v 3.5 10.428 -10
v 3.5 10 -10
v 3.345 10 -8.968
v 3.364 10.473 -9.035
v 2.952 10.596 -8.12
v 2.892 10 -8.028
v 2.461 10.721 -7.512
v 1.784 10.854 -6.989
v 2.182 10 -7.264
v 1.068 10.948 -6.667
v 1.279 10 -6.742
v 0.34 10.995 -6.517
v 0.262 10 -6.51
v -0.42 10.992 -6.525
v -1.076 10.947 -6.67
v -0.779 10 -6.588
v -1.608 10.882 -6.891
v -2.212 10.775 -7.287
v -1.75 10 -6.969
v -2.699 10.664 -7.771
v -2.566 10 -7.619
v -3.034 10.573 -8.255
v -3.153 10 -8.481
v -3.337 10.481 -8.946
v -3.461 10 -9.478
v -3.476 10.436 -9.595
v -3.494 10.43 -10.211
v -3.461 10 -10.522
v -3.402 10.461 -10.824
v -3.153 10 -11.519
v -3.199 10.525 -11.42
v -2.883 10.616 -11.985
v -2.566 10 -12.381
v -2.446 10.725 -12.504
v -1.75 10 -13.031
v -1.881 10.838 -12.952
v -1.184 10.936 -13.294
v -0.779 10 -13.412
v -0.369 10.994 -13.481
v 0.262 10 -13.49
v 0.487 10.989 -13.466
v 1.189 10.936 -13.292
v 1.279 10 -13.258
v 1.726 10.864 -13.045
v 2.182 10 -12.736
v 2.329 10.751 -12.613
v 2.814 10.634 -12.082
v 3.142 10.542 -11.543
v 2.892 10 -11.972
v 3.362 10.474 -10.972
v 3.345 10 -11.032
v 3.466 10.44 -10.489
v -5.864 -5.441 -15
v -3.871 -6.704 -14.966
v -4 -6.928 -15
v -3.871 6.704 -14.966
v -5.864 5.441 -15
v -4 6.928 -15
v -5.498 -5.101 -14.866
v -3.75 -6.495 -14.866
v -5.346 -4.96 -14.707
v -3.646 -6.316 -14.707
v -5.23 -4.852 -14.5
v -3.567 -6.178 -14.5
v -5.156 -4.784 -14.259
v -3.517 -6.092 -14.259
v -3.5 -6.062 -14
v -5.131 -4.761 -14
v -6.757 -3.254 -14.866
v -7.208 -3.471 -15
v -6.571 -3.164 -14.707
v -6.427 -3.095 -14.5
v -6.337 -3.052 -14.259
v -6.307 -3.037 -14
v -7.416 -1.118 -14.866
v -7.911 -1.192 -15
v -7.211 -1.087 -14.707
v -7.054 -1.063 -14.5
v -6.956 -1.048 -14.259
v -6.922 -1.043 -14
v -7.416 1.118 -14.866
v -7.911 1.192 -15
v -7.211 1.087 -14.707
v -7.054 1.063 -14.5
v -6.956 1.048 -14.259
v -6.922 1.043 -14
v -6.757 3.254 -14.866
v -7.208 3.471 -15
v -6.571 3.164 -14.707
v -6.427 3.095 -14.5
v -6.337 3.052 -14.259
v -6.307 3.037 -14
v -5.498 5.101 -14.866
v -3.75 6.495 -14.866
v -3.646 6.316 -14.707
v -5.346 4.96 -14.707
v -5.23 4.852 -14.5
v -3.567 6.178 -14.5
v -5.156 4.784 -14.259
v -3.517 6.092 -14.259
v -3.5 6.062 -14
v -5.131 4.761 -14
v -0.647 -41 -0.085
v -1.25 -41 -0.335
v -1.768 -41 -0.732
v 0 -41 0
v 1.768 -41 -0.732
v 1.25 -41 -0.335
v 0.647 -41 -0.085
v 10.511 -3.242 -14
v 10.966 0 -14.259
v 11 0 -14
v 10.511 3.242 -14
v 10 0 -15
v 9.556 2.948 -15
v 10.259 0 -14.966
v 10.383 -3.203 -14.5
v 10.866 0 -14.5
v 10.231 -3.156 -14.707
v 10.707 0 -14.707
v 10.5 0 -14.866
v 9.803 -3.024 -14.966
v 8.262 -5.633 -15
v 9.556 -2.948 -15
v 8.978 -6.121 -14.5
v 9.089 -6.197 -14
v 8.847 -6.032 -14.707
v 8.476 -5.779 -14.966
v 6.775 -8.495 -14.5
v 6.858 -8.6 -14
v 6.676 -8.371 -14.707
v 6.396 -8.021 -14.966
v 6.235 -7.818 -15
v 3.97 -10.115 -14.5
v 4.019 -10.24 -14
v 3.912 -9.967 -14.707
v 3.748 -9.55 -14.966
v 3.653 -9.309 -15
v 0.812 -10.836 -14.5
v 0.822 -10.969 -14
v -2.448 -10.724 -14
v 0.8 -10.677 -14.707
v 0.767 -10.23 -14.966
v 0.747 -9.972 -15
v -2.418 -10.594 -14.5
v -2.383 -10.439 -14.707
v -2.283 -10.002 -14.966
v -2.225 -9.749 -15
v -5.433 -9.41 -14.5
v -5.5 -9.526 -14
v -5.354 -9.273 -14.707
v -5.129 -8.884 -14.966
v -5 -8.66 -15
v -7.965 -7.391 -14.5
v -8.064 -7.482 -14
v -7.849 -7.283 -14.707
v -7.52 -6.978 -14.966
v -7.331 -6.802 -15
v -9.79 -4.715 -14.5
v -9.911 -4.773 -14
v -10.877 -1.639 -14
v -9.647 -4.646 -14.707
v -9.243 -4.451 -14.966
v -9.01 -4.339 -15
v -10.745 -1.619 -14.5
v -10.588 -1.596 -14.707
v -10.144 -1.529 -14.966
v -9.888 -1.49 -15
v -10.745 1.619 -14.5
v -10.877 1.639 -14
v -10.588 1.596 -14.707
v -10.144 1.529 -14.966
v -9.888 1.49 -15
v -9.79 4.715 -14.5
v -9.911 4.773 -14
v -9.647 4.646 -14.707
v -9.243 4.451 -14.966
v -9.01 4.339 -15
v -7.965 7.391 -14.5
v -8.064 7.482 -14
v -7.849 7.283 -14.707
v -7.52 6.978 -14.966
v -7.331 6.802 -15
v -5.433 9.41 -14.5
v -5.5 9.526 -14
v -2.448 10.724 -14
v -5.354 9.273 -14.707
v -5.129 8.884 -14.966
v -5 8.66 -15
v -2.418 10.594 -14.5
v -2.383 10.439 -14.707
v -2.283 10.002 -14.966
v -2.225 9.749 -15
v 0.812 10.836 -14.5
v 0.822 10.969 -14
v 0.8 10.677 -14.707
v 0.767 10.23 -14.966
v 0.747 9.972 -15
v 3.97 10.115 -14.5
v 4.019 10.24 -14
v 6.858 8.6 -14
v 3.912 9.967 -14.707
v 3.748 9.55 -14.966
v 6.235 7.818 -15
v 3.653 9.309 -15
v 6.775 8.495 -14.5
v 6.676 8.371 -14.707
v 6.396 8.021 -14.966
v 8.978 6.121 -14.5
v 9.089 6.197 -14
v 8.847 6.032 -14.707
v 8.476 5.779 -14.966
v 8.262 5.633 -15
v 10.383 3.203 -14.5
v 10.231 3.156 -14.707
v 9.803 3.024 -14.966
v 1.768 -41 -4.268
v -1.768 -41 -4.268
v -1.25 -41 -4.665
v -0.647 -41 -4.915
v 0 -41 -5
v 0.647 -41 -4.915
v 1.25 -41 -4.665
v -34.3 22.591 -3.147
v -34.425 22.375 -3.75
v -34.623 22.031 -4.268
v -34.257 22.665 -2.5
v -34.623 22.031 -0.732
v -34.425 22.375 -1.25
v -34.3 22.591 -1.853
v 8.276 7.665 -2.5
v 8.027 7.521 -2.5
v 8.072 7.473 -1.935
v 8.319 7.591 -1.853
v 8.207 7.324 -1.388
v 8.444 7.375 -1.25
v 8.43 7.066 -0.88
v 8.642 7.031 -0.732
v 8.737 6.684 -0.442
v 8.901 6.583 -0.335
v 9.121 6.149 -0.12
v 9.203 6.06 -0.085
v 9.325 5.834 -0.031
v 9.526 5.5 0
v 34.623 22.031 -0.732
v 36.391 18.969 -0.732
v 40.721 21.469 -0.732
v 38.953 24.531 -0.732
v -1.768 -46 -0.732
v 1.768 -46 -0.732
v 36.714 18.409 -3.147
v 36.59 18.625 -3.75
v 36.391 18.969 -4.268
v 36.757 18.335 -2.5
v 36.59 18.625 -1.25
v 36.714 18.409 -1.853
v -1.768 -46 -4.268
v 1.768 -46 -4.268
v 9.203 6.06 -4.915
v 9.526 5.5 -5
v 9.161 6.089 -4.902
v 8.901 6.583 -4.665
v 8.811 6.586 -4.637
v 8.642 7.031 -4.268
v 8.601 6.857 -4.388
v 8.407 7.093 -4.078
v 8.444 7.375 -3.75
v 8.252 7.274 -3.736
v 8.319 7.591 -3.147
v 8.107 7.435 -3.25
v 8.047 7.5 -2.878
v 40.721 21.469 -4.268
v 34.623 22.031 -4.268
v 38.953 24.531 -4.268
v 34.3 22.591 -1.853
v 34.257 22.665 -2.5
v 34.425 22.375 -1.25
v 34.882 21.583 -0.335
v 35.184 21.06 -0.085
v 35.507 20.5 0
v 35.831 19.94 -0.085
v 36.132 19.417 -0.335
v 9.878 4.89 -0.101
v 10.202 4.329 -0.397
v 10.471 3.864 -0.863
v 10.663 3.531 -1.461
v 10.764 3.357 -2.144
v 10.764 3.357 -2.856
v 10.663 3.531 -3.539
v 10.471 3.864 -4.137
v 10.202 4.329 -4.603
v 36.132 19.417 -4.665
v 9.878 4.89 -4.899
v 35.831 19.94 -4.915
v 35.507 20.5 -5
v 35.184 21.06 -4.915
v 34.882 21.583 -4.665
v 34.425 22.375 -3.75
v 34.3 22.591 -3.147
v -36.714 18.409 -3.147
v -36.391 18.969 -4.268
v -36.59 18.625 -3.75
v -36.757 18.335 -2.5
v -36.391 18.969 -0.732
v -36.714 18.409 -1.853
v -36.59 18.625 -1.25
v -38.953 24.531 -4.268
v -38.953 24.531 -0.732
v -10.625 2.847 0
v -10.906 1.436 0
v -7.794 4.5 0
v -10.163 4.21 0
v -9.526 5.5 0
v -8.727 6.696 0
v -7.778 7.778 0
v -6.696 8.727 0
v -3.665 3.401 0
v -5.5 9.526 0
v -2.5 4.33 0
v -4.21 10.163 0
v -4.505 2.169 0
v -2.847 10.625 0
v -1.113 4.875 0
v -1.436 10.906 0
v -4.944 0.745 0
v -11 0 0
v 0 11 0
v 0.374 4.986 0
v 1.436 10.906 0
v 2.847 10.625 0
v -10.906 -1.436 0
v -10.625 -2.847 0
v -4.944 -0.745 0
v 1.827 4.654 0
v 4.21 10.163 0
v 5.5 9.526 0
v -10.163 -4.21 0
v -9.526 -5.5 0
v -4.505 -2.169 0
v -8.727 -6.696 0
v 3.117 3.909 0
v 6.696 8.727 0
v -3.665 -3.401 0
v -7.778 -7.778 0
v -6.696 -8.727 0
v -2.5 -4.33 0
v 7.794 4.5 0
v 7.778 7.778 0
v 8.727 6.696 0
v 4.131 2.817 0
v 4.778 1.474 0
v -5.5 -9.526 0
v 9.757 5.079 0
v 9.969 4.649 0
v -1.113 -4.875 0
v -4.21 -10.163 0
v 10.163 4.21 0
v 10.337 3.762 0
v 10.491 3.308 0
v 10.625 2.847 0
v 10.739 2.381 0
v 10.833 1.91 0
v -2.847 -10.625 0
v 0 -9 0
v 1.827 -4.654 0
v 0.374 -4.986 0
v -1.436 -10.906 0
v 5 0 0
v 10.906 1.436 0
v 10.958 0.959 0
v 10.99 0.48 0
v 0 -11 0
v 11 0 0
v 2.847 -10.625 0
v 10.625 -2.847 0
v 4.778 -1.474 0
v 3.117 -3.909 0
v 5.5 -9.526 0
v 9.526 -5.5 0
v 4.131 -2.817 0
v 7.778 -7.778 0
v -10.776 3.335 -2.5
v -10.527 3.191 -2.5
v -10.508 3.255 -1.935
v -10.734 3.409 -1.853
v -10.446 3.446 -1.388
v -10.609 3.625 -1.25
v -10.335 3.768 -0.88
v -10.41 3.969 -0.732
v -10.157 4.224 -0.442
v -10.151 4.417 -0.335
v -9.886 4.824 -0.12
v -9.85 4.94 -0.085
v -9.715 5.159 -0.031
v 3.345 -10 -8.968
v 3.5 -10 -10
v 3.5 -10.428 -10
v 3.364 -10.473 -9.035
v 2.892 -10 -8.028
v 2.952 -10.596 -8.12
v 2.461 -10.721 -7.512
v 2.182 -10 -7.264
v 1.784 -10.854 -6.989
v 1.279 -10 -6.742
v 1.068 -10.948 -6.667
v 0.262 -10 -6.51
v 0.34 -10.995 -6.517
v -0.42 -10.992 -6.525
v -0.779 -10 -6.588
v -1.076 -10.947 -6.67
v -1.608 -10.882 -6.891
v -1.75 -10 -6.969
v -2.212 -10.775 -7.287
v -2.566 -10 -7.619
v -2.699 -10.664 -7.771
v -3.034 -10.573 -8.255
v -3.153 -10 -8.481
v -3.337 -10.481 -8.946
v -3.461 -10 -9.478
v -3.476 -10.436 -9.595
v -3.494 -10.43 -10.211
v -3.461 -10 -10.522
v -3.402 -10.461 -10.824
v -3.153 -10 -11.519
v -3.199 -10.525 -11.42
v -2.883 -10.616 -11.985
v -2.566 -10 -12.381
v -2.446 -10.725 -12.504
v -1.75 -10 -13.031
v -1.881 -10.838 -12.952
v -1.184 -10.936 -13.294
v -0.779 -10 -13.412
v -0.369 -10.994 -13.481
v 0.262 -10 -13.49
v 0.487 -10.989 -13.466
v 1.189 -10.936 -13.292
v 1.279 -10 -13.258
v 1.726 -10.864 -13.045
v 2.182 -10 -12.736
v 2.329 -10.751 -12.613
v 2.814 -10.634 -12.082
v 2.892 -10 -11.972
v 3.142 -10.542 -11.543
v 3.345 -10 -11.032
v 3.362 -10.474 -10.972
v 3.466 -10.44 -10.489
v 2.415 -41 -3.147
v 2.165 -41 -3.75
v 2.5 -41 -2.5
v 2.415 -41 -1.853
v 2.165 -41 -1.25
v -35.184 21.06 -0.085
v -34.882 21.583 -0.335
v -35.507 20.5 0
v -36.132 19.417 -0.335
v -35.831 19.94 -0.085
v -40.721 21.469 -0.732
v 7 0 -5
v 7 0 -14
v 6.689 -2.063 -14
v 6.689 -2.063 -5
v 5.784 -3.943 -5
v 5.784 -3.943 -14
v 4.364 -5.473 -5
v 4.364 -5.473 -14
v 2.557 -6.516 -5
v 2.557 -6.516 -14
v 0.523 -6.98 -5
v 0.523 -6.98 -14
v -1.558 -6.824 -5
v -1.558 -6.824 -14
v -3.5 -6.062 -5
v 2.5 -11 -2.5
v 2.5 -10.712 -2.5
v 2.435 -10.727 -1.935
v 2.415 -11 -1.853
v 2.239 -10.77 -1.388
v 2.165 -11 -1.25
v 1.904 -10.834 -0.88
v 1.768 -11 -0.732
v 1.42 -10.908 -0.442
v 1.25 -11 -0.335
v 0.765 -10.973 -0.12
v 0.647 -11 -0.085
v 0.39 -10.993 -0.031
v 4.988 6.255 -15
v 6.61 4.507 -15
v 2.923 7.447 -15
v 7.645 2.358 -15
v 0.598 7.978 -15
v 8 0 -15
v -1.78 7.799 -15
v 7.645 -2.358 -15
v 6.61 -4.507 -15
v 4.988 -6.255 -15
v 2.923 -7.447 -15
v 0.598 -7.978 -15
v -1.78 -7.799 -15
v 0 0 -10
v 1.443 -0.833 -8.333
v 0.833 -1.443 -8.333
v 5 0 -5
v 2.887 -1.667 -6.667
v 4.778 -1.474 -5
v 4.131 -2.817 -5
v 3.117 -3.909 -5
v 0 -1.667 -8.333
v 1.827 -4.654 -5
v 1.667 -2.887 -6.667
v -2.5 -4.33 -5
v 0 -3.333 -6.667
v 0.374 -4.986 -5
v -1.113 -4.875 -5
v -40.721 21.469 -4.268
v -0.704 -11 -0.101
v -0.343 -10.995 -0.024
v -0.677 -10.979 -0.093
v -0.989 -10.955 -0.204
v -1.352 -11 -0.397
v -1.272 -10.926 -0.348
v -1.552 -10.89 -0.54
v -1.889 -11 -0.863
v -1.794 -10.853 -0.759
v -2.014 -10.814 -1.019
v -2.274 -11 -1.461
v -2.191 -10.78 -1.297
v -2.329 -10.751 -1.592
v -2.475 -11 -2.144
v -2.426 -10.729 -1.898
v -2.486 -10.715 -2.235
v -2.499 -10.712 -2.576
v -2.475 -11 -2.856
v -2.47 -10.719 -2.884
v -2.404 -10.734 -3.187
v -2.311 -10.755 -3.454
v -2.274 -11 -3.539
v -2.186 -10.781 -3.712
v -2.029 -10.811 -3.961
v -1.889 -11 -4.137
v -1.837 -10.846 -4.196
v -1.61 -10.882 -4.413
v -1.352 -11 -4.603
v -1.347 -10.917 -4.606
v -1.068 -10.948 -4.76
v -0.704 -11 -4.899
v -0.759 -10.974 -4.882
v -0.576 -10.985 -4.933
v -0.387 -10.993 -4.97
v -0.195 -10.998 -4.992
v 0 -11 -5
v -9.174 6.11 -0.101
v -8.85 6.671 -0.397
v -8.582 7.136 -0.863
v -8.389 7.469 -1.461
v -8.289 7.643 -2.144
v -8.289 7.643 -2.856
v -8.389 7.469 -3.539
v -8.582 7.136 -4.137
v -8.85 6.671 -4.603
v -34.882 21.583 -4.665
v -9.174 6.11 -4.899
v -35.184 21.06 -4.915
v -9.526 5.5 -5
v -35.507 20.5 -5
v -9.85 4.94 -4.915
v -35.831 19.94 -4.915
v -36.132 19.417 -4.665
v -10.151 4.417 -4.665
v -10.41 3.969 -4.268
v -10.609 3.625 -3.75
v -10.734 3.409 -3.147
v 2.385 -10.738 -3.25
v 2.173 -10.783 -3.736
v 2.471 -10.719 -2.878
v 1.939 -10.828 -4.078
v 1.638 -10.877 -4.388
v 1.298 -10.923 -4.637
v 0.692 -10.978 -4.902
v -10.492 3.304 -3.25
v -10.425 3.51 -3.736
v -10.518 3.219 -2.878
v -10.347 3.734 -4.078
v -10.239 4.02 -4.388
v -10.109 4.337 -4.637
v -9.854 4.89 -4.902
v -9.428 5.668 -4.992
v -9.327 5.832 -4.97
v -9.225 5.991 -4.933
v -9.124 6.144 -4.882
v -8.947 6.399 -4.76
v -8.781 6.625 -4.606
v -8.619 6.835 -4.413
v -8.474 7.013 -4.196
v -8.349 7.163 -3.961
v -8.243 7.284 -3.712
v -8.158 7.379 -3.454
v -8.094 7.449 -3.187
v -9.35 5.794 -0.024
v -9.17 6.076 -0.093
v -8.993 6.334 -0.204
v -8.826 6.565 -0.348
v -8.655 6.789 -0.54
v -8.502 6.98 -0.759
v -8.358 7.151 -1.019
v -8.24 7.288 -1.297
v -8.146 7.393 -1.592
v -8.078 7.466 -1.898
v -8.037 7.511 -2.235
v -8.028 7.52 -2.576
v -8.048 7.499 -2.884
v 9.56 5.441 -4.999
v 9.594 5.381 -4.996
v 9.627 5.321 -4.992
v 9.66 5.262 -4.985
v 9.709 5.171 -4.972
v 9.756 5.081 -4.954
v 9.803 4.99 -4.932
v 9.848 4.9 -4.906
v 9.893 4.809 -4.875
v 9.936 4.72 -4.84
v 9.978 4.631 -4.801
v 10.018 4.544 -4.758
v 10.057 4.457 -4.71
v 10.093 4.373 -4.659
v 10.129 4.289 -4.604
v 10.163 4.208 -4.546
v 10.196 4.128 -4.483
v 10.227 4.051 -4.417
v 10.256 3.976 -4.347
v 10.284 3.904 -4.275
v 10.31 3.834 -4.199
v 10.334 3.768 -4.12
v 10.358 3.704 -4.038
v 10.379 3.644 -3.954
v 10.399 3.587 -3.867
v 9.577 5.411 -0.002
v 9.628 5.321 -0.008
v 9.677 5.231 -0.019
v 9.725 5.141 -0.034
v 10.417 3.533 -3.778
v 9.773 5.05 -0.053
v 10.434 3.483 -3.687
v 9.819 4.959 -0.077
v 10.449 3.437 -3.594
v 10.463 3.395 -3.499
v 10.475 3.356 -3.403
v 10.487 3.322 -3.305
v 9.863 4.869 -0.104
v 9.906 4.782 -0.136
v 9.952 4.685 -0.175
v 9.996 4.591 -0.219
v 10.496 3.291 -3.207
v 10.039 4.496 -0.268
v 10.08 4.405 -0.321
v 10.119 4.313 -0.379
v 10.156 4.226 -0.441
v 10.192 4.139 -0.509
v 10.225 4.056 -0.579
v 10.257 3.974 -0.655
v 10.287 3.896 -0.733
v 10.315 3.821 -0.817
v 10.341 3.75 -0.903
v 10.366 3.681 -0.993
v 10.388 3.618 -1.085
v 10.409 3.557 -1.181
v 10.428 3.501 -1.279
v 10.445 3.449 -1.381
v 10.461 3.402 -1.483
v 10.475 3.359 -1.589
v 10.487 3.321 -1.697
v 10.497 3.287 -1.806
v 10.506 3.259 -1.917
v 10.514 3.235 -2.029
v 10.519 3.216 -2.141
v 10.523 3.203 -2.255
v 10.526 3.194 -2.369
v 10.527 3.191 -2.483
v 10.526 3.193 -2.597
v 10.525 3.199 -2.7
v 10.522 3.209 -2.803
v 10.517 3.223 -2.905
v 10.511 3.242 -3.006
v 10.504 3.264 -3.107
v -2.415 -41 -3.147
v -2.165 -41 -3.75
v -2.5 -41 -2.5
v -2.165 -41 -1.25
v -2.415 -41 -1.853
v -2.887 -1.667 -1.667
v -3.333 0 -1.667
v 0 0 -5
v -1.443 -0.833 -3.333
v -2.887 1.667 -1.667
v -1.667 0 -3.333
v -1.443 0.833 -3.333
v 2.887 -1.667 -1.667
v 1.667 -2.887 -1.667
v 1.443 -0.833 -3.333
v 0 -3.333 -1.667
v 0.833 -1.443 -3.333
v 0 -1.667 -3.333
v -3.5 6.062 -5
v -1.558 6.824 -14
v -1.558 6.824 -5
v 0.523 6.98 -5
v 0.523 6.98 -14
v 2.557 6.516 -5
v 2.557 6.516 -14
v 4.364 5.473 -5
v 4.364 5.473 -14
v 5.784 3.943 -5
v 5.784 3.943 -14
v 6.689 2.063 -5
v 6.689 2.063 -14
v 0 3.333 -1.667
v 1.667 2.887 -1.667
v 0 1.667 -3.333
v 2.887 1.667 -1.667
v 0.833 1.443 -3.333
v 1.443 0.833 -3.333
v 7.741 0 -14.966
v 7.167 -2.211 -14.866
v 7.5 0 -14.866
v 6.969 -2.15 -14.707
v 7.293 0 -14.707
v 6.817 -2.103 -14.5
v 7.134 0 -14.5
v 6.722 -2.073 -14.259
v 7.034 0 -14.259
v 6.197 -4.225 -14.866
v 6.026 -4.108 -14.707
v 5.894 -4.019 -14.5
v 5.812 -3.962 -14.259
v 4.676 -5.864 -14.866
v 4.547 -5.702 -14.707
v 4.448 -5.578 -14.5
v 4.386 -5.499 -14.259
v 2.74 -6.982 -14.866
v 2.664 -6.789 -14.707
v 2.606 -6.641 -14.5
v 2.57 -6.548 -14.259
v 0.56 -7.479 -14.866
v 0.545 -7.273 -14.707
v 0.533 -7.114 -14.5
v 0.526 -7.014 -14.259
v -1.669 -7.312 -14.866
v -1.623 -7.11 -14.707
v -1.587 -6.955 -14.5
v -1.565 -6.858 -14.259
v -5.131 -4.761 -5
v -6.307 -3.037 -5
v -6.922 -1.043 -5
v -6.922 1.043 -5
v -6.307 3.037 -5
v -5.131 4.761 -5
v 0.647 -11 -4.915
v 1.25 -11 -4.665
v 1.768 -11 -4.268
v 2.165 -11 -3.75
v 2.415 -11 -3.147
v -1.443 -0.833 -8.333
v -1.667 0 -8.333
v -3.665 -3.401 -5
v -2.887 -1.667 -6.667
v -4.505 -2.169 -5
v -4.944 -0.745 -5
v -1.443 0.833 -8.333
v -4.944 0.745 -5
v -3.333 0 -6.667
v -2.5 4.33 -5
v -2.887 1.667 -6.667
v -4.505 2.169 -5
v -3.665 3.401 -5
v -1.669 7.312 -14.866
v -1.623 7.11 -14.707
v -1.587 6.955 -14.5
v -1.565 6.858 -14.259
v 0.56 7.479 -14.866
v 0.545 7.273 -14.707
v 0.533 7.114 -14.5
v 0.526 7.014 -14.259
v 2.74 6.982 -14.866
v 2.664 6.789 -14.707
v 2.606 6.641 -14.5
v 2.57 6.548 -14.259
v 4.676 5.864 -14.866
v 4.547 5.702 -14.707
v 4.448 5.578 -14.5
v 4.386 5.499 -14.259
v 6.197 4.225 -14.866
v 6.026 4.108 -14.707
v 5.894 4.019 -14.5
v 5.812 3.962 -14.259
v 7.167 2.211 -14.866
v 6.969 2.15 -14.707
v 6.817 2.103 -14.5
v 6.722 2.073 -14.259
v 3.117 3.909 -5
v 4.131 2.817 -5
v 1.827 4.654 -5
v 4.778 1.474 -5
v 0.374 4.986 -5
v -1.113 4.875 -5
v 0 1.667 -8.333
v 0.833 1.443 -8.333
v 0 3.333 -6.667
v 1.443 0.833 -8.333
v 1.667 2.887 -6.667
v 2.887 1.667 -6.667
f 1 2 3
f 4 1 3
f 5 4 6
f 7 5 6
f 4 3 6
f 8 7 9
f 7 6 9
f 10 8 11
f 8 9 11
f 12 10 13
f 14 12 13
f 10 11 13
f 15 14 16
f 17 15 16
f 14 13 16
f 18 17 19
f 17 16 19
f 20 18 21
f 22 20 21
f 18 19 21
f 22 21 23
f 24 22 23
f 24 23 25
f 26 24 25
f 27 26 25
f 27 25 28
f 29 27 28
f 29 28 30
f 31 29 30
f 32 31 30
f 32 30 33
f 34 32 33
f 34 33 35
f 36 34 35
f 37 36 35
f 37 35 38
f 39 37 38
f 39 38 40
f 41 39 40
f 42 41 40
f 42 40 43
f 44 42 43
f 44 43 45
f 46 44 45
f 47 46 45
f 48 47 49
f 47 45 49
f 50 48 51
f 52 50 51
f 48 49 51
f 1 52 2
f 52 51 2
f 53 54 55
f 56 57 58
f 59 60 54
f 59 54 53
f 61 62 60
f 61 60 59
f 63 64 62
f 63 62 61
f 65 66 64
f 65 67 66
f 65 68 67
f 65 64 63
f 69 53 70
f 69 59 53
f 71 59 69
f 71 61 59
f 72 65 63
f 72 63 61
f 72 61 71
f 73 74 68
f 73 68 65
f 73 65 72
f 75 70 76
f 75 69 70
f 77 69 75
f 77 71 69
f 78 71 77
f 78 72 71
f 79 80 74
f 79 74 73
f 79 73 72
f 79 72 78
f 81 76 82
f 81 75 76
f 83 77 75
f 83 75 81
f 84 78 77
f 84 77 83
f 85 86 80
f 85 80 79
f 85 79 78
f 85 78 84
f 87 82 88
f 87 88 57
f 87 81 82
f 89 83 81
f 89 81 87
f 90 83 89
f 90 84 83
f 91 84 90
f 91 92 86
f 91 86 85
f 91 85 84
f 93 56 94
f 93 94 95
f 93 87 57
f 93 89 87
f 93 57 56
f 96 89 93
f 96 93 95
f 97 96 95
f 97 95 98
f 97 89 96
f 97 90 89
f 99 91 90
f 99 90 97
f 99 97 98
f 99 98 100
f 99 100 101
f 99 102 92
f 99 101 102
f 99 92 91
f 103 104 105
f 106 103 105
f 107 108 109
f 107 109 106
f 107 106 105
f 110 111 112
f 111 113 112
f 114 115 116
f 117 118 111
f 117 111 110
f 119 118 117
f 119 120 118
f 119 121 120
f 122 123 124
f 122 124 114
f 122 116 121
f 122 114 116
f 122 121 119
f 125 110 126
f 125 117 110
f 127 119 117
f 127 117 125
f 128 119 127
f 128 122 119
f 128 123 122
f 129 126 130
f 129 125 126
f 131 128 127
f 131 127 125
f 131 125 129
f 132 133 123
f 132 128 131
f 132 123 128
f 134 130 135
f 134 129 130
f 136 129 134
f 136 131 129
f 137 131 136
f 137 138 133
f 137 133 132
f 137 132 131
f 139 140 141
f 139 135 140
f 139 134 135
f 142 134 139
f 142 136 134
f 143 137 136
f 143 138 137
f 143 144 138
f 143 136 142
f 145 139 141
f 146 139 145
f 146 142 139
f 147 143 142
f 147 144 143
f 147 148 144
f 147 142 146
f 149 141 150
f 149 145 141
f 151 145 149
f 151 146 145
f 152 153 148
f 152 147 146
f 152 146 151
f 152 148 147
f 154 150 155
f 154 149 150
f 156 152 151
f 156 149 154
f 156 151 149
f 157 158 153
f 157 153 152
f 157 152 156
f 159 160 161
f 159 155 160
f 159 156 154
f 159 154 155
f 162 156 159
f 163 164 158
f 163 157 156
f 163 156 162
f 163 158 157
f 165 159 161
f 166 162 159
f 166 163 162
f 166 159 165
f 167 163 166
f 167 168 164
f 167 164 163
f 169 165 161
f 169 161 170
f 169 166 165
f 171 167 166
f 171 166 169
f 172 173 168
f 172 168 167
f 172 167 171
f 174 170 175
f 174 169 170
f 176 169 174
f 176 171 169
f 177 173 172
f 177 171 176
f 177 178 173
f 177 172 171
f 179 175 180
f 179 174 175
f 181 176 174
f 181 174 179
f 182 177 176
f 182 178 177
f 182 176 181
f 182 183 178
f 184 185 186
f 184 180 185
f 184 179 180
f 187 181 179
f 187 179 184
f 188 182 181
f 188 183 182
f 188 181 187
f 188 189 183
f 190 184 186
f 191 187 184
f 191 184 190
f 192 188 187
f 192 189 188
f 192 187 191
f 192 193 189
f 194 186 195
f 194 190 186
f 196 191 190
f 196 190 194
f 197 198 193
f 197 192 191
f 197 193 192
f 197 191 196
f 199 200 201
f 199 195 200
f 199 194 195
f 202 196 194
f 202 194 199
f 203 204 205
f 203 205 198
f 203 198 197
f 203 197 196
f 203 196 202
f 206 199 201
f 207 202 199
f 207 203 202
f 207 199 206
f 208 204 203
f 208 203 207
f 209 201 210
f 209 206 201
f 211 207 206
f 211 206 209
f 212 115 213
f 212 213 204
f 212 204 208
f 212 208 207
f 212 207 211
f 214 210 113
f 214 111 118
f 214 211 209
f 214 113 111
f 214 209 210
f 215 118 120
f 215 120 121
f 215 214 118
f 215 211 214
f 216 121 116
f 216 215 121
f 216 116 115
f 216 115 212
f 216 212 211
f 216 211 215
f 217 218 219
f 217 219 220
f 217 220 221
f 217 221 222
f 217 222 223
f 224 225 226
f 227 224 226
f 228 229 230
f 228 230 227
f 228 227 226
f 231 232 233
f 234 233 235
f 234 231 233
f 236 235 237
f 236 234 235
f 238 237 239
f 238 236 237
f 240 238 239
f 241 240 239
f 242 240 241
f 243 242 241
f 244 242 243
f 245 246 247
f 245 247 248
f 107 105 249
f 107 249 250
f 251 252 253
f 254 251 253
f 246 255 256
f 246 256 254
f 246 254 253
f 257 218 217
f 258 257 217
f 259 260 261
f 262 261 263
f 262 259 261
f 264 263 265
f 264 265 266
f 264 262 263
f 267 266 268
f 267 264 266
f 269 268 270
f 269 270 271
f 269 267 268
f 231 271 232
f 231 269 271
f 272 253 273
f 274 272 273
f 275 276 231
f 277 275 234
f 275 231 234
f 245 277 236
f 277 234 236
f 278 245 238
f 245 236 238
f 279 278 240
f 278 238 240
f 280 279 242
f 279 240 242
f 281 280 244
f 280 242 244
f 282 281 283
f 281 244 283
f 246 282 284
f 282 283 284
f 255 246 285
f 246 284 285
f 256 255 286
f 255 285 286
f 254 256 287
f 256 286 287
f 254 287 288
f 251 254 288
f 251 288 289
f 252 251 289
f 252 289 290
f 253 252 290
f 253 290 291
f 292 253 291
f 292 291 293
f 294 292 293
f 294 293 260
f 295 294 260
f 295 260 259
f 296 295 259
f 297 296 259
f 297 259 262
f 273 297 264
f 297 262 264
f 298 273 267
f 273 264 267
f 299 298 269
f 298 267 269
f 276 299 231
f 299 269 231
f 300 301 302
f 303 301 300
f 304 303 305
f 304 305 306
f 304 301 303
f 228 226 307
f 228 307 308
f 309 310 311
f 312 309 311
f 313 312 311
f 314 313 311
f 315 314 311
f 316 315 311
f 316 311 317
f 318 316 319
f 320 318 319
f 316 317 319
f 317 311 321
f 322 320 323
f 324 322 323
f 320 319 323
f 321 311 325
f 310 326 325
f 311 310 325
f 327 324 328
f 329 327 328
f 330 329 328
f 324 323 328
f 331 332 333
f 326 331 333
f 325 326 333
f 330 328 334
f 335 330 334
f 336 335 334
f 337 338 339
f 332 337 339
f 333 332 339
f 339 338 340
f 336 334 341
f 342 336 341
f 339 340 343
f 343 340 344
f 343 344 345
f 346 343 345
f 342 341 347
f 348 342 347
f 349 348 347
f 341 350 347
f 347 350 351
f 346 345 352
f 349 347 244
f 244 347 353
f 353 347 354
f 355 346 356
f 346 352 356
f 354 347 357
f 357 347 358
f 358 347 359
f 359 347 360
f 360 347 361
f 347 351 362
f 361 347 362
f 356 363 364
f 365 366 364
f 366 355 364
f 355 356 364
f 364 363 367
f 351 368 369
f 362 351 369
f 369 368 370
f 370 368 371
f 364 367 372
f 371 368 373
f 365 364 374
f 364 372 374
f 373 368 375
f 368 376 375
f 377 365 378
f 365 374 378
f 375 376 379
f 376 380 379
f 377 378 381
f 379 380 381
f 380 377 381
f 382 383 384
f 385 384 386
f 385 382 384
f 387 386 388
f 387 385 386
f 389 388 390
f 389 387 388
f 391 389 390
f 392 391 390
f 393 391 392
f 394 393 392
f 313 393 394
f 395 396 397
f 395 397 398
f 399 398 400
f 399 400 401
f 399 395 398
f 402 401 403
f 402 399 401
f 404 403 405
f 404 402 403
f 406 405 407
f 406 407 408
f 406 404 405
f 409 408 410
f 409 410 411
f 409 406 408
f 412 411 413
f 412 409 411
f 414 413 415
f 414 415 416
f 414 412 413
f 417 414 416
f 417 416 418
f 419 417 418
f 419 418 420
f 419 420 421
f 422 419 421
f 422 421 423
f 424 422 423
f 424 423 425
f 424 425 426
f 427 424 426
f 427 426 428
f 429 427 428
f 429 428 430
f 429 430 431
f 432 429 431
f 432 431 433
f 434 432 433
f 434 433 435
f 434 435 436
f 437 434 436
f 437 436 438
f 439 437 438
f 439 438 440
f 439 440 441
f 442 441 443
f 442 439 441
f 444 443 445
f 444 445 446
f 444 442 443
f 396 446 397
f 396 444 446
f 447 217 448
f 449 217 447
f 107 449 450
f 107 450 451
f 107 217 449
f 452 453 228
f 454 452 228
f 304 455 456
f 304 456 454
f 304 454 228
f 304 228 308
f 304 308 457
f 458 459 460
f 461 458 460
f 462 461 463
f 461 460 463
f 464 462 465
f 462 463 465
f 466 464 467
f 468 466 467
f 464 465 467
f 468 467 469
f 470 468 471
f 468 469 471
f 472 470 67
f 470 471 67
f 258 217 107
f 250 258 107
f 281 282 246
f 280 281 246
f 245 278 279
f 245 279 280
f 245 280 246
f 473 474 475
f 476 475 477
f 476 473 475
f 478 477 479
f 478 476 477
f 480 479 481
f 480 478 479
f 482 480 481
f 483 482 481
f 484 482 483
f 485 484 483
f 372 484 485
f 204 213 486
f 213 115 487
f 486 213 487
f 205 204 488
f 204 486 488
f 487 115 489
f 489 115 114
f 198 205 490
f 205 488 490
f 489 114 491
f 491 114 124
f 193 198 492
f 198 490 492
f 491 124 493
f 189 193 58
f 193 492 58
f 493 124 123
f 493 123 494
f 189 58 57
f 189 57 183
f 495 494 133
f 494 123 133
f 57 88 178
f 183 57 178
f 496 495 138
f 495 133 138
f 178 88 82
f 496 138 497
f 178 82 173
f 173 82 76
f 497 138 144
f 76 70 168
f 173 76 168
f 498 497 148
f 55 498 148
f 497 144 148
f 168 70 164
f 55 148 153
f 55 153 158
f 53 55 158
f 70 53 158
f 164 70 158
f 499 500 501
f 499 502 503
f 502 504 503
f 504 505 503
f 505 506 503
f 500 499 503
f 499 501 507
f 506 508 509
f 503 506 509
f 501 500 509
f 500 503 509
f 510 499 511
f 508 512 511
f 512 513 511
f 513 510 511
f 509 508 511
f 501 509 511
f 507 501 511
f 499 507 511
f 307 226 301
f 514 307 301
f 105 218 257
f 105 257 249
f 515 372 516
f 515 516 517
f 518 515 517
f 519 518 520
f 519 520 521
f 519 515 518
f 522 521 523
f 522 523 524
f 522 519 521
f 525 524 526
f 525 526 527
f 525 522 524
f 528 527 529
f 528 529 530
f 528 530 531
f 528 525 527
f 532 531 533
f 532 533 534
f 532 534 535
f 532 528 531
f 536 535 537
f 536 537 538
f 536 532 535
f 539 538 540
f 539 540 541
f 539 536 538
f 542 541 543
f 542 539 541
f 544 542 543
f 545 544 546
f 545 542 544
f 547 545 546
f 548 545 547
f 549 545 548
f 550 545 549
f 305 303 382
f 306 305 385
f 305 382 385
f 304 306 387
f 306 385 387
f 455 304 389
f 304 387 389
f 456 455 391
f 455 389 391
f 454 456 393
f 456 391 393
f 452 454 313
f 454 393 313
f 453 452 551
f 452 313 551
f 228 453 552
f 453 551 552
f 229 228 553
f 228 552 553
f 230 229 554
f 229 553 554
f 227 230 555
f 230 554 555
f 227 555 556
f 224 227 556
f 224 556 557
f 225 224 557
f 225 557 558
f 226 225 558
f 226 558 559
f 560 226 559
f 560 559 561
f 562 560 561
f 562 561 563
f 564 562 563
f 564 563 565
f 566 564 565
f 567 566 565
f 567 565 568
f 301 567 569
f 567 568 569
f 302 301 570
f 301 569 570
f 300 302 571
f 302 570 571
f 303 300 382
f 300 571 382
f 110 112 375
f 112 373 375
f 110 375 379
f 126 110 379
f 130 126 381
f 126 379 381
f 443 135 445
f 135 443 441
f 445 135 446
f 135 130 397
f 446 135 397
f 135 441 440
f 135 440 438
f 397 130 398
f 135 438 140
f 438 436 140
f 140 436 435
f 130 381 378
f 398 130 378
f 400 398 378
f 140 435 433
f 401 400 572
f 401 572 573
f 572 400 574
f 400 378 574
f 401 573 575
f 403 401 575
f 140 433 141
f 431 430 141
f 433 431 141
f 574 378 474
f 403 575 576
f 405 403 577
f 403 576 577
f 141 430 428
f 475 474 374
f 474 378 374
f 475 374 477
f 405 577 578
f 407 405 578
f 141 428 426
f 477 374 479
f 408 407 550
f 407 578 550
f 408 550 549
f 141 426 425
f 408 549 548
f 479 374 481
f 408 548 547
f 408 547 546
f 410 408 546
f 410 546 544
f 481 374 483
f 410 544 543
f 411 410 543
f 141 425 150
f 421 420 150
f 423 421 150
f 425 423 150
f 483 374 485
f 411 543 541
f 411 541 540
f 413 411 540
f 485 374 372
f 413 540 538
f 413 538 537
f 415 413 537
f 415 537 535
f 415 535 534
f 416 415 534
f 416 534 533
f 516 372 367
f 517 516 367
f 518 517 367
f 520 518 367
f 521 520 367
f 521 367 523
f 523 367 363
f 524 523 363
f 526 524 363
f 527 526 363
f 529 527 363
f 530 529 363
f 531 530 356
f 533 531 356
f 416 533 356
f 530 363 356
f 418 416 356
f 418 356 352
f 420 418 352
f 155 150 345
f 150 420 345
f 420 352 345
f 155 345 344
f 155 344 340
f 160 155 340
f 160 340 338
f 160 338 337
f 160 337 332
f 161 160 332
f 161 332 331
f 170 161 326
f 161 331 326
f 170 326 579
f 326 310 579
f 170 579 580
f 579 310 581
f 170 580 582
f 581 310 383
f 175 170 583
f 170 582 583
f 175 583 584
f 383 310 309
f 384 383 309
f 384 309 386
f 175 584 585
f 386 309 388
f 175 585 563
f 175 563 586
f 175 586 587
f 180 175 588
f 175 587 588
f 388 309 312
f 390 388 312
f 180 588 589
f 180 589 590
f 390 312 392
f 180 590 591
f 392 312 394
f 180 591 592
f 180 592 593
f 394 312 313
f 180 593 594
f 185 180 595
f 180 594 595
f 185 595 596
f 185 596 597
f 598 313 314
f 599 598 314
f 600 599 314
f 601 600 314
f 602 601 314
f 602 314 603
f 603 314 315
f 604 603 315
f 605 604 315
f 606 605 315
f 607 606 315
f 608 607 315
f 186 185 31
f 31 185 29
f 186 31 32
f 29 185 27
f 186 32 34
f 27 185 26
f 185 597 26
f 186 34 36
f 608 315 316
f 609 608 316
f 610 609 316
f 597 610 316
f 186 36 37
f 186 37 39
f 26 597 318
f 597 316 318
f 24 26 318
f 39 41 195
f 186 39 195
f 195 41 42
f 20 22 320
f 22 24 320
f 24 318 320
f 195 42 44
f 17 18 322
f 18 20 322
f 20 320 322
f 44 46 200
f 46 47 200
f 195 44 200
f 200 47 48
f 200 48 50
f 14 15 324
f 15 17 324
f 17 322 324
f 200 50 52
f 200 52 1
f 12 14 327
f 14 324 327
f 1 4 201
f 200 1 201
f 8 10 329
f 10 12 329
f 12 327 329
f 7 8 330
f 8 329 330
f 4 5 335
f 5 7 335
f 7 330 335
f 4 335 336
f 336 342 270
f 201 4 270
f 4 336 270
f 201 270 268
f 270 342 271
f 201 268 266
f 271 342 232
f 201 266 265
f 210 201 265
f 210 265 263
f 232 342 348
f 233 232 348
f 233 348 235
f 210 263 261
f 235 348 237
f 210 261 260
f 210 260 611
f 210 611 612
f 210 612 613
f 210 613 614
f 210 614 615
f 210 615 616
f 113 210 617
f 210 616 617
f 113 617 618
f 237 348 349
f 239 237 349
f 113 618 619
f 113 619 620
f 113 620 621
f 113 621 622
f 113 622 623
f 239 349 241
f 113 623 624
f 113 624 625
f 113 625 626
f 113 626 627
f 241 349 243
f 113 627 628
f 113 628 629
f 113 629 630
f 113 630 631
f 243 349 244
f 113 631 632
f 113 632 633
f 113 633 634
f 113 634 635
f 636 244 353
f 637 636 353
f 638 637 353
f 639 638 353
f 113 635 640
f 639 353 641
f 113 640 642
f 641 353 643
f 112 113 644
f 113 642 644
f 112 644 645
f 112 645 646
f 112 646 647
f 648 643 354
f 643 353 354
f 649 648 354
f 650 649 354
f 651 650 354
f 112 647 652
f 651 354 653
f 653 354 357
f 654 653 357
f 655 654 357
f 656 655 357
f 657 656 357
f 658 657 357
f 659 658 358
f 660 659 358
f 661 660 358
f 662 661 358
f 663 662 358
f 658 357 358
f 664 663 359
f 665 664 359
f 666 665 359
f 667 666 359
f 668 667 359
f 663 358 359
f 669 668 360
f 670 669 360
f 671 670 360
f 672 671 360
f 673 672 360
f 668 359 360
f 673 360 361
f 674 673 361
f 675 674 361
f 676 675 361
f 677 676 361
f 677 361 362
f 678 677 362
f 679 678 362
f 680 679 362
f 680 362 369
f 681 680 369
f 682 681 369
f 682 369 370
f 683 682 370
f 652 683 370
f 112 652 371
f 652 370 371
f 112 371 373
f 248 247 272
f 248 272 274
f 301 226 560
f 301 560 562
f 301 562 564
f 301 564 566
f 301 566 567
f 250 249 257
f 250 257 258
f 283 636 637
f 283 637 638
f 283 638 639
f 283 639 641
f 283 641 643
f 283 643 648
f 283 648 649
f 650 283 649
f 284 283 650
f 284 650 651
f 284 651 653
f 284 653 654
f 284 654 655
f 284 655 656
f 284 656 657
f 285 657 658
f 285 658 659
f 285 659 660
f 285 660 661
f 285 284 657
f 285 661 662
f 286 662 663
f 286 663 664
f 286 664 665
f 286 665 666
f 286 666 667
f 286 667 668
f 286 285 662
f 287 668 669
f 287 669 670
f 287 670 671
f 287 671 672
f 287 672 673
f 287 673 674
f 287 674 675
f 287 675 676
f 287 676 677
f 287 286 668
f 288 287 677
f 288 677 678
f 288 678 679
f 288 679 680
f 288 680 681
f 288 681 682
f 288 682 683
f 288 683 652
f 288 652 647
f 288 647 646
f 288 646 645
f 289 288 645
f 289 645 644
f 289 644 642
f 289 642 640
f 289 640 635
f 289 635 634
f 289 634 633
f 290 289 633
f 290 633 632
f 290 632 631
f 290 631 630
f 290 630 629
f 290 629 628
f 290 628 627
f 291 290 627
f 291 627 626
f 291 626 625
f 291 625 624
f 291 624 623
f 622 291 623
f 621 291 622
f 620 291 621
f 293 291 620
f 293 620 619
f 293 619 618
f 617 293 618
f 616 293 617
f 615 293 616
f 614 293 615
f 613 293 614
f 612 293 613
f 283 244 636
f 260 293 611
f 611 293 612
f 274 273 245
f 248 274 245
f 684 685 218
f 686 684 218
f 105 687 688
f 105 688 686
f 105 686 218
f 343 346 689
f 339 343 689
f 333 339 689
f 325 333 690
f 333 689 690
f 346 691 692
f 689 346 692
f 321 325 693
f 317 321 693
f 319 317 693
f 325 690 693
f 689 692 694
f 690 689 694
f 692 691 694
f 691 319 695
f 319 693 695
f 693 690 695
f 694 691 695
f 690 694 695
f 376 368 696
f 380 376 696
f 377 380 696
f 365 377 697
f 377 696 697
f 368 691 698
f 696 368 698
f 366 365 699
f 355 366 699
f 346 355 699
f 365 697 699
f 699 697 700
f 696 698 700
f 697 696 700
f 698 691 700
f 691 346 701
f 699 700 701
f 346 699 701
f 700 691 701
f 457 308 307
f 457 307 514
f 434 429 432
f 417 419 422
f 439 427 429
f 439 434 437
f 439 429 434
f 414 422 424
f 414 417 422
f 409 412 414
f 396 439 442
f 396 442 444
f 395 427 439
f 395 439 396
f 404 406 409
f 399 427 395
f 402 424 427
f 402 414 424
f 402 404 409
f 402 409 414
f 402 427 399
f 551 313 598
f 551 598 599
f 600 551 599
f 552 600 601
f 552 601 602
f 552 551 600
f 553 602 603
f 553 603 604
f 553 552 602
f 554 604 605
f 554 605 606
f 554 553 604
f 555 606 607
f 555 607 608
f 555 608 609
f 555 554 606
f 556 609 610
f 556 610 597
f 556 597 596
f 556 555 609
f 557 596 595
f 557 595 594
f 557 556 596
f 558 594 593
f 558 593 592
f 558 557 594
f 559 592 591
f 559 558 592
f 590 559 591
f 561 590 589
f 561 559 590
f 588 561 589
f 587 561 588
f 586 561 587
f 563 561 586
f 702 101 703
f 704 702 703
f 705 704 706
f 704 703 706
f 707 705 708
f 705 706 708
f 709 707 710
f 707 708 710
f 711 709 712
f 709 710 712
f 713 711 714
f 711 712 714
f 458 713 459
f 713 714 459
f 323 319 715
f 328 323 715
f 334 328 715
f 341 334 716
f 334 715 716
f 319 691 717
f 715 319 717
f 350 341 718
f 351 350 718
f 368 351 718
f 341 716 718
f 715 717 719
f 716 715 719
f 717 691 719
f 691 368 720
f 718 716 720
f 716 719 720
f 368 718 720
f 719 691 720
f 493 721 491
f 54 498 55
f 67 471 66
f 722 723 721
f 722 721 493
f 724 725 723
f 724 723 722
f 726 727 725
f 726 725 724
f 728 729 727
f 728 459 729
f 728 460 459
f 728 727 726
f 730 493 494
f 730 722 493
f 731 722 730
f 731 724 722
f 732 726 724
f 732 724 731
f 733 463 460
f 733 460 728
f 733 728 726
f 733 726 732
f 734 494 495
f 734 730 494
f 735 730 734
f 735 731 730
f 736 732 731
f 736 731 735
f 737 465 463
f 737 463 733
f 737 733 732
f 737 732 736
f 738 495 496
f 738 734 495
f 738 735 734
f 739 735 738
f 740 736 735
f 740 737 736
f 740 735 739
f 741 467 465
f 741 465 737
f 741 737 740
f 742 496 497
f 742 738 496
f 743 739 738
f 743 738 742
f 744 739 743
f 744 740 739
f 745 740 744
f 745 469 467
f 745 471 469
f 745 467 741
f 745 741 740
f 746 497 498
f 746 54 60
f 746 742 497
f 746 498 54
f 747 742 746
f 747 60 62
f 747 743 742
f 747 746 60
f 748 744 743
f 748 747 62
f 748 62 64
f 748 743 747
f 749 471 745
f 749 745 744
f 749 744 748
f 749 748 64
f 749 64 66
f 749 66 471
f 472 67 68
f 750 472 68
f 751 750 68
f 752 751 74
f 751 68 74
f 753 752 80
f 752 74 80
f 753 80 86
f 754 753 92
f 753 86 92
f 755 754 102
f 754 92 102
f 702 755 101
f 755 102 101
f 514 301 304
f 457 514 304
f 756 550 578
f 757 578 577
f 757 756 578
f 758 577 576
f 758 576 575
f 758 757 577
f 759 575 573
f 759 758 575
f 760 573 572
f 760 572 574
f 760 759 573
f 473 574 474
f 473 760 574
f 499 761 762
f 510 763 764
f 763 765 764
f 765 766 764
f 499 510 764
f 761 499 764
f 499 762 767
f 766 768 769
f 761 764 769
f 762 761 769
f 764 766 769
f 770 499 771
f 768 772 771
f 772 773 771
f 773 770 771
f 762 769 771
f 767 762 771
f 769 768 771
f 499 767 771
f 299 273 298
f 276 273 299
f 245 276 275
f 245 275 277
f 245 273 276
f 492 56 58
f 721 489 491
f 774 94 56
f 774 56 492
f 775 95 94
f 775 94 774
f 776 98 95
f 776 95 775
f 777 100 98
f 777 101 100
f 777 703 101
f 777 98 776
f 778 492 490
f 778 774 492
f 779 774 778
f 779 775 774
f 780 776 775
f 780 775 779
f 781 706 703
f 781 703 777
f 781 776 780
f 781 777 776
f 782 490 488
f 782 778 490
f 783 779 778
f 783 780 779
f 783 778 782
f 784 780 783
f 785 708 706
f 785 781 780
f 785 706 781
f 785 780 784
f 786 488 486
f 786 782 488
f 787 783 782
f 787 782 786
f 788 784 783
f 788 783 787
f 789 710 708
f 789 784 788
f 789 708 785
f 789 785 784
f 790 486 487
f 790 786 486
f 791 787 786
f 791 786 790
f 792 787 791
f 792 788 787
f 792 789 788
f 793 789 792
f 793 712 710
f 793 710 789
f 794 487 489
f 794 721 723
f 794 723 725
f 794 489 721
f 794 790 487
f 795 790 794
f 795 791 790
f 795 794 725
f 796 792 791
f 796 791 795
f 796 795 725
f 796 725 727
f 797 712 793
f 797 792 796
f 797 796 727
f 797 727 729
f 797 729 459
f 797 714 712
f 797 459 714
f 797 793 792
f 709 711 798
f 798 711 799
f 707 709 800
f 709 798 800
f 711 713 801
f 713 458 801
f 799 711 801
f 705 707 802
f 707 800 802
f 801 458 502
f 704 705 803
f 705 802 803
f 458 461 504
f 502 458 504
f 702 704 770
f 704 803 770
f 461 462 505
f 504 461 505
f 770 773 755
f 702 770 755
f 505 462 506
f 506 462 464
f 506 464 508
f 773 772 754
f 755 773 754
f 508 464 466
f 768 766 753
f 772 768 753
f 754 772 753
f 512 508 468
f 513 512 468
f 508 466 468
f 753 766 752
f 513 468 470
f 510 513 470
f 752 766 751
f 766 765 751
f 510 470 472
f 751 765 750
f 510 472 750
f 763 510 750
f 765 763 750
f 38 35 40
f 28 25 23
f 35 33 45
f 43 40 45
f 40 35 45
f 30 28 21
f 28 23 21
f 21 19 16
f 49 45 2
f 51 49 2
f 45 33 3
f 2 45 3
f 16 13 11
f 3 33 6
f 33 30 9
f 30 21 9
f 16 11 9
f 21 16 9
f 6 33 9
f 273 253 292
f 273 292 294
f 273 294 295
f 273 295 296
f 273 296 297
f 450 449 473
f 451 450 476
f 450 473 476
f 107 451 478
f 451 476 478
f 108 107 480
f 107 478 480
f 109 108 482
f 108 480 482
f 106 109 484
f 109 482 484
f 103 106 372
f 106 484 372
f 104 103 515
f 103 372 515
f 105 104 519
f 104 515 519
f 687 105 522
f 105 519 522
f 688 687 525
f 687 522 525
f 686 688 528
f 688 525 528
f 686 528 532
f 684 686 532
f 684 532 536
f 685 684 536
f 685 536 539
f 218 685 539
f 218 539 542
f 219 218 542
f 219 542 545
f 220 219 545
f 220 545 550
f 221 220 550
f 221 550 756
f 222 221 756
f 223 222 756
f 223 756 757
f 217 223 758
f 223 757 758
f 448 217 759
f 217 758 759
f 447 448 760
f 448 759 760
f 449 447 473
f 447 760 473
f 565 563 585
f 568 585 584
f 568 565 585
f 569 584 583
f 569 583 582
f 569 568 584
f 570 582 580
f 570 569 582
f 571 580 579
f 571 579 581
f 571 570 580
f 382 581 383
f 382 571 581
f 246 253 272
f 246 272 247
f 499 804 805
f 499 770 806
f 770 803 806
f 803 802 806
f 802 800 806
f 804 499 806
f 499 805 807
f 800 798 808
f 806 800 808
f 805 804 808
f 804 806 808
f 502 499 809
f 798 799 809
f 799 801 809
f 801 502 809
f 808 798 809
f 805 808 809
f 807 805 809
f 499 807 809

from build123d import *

# Parameters (mm, degrees)
F1_R          = 2.5
F2_DEPTH      = 30
F2_DEPTH_BACK = 2
F3_W          = 3.5355339059
F3_H          = 3.5355339059
F4_DEPTH      = 5
F5_COUNT      = 3
F6_R          = 1
F8_START      = 10
F7_R          = 3.5
F8_DEPTH      = 2
F9_START      = -10
F9_DEPTH      = 2


with BuildPart() as f11:
    # F10 (on Front) → F11 (revolve)
    with BuildSketch(Plane.XZ):
        Polygon((0, -5), (0, -10), (5, -5), (7, -5), (7, -15), (11, -15), (11, 0), (5, 0), align=None)
    revolve(axis=Axis((0, 0, -0.1335814595), (0, 0, -1)))

    # F1 (on offset) → F2 (join, two sides)
    with BuildSketch(Plane.XZ.offset(11)) as f2_sk:
        with Locations((0, -2.5)):
            Circle(F1_R)
    extrude(amount=F2_DEPTH)
    extrude(f2_sk.sketch, amount=-F2_DEPTH_BACK)

    # F3 (on face) → F4 (join)
    with BuildSketch(Plane.XZ.offset(41)):
        with Locations((0, -2.5)):
            Rectangle(F3_W, F3_H)
    extrude(amount=F4_DEPTH)

    # F5: F11 ×3 about axis
    f5_axis = Axis((0, 0, -15), (0, 0, 1))


with BuildPart() as f11_1:
    add(f11.part)
    for i in range(1, F5_COUNT):
        add(f11.part.rotate(f5_axis, i * 360 / F5_COUNT))

    # F6
    f6_edges = [f11_1.edges().sort_by_distance(p)[0] for p in [
        (-11, 0, -15),
        (-7, 0, -15),
    ]]
    fillet(f6_edges, radius=F6_R)

    # F7 (on Front) → F8 (cut)
    with BuildSketch(Plane.XZ.offset(F8_START)):
        with Locations((0, -10)):
            Circle(F7_R)
    extrude(amount=F8_DEPTH, mode=Mode.SUBTRACT)

    # F7 (on Front) → F9 (cut)
    with BuildSketch(Plane.XZ.offset(F9_START)):
        with Locations((0, -10)):
            Circle(F7_R)
    extrude(amount=-F9_DEPTH, mode=Mode.SUBTRACT)


solid = f11_1.part
